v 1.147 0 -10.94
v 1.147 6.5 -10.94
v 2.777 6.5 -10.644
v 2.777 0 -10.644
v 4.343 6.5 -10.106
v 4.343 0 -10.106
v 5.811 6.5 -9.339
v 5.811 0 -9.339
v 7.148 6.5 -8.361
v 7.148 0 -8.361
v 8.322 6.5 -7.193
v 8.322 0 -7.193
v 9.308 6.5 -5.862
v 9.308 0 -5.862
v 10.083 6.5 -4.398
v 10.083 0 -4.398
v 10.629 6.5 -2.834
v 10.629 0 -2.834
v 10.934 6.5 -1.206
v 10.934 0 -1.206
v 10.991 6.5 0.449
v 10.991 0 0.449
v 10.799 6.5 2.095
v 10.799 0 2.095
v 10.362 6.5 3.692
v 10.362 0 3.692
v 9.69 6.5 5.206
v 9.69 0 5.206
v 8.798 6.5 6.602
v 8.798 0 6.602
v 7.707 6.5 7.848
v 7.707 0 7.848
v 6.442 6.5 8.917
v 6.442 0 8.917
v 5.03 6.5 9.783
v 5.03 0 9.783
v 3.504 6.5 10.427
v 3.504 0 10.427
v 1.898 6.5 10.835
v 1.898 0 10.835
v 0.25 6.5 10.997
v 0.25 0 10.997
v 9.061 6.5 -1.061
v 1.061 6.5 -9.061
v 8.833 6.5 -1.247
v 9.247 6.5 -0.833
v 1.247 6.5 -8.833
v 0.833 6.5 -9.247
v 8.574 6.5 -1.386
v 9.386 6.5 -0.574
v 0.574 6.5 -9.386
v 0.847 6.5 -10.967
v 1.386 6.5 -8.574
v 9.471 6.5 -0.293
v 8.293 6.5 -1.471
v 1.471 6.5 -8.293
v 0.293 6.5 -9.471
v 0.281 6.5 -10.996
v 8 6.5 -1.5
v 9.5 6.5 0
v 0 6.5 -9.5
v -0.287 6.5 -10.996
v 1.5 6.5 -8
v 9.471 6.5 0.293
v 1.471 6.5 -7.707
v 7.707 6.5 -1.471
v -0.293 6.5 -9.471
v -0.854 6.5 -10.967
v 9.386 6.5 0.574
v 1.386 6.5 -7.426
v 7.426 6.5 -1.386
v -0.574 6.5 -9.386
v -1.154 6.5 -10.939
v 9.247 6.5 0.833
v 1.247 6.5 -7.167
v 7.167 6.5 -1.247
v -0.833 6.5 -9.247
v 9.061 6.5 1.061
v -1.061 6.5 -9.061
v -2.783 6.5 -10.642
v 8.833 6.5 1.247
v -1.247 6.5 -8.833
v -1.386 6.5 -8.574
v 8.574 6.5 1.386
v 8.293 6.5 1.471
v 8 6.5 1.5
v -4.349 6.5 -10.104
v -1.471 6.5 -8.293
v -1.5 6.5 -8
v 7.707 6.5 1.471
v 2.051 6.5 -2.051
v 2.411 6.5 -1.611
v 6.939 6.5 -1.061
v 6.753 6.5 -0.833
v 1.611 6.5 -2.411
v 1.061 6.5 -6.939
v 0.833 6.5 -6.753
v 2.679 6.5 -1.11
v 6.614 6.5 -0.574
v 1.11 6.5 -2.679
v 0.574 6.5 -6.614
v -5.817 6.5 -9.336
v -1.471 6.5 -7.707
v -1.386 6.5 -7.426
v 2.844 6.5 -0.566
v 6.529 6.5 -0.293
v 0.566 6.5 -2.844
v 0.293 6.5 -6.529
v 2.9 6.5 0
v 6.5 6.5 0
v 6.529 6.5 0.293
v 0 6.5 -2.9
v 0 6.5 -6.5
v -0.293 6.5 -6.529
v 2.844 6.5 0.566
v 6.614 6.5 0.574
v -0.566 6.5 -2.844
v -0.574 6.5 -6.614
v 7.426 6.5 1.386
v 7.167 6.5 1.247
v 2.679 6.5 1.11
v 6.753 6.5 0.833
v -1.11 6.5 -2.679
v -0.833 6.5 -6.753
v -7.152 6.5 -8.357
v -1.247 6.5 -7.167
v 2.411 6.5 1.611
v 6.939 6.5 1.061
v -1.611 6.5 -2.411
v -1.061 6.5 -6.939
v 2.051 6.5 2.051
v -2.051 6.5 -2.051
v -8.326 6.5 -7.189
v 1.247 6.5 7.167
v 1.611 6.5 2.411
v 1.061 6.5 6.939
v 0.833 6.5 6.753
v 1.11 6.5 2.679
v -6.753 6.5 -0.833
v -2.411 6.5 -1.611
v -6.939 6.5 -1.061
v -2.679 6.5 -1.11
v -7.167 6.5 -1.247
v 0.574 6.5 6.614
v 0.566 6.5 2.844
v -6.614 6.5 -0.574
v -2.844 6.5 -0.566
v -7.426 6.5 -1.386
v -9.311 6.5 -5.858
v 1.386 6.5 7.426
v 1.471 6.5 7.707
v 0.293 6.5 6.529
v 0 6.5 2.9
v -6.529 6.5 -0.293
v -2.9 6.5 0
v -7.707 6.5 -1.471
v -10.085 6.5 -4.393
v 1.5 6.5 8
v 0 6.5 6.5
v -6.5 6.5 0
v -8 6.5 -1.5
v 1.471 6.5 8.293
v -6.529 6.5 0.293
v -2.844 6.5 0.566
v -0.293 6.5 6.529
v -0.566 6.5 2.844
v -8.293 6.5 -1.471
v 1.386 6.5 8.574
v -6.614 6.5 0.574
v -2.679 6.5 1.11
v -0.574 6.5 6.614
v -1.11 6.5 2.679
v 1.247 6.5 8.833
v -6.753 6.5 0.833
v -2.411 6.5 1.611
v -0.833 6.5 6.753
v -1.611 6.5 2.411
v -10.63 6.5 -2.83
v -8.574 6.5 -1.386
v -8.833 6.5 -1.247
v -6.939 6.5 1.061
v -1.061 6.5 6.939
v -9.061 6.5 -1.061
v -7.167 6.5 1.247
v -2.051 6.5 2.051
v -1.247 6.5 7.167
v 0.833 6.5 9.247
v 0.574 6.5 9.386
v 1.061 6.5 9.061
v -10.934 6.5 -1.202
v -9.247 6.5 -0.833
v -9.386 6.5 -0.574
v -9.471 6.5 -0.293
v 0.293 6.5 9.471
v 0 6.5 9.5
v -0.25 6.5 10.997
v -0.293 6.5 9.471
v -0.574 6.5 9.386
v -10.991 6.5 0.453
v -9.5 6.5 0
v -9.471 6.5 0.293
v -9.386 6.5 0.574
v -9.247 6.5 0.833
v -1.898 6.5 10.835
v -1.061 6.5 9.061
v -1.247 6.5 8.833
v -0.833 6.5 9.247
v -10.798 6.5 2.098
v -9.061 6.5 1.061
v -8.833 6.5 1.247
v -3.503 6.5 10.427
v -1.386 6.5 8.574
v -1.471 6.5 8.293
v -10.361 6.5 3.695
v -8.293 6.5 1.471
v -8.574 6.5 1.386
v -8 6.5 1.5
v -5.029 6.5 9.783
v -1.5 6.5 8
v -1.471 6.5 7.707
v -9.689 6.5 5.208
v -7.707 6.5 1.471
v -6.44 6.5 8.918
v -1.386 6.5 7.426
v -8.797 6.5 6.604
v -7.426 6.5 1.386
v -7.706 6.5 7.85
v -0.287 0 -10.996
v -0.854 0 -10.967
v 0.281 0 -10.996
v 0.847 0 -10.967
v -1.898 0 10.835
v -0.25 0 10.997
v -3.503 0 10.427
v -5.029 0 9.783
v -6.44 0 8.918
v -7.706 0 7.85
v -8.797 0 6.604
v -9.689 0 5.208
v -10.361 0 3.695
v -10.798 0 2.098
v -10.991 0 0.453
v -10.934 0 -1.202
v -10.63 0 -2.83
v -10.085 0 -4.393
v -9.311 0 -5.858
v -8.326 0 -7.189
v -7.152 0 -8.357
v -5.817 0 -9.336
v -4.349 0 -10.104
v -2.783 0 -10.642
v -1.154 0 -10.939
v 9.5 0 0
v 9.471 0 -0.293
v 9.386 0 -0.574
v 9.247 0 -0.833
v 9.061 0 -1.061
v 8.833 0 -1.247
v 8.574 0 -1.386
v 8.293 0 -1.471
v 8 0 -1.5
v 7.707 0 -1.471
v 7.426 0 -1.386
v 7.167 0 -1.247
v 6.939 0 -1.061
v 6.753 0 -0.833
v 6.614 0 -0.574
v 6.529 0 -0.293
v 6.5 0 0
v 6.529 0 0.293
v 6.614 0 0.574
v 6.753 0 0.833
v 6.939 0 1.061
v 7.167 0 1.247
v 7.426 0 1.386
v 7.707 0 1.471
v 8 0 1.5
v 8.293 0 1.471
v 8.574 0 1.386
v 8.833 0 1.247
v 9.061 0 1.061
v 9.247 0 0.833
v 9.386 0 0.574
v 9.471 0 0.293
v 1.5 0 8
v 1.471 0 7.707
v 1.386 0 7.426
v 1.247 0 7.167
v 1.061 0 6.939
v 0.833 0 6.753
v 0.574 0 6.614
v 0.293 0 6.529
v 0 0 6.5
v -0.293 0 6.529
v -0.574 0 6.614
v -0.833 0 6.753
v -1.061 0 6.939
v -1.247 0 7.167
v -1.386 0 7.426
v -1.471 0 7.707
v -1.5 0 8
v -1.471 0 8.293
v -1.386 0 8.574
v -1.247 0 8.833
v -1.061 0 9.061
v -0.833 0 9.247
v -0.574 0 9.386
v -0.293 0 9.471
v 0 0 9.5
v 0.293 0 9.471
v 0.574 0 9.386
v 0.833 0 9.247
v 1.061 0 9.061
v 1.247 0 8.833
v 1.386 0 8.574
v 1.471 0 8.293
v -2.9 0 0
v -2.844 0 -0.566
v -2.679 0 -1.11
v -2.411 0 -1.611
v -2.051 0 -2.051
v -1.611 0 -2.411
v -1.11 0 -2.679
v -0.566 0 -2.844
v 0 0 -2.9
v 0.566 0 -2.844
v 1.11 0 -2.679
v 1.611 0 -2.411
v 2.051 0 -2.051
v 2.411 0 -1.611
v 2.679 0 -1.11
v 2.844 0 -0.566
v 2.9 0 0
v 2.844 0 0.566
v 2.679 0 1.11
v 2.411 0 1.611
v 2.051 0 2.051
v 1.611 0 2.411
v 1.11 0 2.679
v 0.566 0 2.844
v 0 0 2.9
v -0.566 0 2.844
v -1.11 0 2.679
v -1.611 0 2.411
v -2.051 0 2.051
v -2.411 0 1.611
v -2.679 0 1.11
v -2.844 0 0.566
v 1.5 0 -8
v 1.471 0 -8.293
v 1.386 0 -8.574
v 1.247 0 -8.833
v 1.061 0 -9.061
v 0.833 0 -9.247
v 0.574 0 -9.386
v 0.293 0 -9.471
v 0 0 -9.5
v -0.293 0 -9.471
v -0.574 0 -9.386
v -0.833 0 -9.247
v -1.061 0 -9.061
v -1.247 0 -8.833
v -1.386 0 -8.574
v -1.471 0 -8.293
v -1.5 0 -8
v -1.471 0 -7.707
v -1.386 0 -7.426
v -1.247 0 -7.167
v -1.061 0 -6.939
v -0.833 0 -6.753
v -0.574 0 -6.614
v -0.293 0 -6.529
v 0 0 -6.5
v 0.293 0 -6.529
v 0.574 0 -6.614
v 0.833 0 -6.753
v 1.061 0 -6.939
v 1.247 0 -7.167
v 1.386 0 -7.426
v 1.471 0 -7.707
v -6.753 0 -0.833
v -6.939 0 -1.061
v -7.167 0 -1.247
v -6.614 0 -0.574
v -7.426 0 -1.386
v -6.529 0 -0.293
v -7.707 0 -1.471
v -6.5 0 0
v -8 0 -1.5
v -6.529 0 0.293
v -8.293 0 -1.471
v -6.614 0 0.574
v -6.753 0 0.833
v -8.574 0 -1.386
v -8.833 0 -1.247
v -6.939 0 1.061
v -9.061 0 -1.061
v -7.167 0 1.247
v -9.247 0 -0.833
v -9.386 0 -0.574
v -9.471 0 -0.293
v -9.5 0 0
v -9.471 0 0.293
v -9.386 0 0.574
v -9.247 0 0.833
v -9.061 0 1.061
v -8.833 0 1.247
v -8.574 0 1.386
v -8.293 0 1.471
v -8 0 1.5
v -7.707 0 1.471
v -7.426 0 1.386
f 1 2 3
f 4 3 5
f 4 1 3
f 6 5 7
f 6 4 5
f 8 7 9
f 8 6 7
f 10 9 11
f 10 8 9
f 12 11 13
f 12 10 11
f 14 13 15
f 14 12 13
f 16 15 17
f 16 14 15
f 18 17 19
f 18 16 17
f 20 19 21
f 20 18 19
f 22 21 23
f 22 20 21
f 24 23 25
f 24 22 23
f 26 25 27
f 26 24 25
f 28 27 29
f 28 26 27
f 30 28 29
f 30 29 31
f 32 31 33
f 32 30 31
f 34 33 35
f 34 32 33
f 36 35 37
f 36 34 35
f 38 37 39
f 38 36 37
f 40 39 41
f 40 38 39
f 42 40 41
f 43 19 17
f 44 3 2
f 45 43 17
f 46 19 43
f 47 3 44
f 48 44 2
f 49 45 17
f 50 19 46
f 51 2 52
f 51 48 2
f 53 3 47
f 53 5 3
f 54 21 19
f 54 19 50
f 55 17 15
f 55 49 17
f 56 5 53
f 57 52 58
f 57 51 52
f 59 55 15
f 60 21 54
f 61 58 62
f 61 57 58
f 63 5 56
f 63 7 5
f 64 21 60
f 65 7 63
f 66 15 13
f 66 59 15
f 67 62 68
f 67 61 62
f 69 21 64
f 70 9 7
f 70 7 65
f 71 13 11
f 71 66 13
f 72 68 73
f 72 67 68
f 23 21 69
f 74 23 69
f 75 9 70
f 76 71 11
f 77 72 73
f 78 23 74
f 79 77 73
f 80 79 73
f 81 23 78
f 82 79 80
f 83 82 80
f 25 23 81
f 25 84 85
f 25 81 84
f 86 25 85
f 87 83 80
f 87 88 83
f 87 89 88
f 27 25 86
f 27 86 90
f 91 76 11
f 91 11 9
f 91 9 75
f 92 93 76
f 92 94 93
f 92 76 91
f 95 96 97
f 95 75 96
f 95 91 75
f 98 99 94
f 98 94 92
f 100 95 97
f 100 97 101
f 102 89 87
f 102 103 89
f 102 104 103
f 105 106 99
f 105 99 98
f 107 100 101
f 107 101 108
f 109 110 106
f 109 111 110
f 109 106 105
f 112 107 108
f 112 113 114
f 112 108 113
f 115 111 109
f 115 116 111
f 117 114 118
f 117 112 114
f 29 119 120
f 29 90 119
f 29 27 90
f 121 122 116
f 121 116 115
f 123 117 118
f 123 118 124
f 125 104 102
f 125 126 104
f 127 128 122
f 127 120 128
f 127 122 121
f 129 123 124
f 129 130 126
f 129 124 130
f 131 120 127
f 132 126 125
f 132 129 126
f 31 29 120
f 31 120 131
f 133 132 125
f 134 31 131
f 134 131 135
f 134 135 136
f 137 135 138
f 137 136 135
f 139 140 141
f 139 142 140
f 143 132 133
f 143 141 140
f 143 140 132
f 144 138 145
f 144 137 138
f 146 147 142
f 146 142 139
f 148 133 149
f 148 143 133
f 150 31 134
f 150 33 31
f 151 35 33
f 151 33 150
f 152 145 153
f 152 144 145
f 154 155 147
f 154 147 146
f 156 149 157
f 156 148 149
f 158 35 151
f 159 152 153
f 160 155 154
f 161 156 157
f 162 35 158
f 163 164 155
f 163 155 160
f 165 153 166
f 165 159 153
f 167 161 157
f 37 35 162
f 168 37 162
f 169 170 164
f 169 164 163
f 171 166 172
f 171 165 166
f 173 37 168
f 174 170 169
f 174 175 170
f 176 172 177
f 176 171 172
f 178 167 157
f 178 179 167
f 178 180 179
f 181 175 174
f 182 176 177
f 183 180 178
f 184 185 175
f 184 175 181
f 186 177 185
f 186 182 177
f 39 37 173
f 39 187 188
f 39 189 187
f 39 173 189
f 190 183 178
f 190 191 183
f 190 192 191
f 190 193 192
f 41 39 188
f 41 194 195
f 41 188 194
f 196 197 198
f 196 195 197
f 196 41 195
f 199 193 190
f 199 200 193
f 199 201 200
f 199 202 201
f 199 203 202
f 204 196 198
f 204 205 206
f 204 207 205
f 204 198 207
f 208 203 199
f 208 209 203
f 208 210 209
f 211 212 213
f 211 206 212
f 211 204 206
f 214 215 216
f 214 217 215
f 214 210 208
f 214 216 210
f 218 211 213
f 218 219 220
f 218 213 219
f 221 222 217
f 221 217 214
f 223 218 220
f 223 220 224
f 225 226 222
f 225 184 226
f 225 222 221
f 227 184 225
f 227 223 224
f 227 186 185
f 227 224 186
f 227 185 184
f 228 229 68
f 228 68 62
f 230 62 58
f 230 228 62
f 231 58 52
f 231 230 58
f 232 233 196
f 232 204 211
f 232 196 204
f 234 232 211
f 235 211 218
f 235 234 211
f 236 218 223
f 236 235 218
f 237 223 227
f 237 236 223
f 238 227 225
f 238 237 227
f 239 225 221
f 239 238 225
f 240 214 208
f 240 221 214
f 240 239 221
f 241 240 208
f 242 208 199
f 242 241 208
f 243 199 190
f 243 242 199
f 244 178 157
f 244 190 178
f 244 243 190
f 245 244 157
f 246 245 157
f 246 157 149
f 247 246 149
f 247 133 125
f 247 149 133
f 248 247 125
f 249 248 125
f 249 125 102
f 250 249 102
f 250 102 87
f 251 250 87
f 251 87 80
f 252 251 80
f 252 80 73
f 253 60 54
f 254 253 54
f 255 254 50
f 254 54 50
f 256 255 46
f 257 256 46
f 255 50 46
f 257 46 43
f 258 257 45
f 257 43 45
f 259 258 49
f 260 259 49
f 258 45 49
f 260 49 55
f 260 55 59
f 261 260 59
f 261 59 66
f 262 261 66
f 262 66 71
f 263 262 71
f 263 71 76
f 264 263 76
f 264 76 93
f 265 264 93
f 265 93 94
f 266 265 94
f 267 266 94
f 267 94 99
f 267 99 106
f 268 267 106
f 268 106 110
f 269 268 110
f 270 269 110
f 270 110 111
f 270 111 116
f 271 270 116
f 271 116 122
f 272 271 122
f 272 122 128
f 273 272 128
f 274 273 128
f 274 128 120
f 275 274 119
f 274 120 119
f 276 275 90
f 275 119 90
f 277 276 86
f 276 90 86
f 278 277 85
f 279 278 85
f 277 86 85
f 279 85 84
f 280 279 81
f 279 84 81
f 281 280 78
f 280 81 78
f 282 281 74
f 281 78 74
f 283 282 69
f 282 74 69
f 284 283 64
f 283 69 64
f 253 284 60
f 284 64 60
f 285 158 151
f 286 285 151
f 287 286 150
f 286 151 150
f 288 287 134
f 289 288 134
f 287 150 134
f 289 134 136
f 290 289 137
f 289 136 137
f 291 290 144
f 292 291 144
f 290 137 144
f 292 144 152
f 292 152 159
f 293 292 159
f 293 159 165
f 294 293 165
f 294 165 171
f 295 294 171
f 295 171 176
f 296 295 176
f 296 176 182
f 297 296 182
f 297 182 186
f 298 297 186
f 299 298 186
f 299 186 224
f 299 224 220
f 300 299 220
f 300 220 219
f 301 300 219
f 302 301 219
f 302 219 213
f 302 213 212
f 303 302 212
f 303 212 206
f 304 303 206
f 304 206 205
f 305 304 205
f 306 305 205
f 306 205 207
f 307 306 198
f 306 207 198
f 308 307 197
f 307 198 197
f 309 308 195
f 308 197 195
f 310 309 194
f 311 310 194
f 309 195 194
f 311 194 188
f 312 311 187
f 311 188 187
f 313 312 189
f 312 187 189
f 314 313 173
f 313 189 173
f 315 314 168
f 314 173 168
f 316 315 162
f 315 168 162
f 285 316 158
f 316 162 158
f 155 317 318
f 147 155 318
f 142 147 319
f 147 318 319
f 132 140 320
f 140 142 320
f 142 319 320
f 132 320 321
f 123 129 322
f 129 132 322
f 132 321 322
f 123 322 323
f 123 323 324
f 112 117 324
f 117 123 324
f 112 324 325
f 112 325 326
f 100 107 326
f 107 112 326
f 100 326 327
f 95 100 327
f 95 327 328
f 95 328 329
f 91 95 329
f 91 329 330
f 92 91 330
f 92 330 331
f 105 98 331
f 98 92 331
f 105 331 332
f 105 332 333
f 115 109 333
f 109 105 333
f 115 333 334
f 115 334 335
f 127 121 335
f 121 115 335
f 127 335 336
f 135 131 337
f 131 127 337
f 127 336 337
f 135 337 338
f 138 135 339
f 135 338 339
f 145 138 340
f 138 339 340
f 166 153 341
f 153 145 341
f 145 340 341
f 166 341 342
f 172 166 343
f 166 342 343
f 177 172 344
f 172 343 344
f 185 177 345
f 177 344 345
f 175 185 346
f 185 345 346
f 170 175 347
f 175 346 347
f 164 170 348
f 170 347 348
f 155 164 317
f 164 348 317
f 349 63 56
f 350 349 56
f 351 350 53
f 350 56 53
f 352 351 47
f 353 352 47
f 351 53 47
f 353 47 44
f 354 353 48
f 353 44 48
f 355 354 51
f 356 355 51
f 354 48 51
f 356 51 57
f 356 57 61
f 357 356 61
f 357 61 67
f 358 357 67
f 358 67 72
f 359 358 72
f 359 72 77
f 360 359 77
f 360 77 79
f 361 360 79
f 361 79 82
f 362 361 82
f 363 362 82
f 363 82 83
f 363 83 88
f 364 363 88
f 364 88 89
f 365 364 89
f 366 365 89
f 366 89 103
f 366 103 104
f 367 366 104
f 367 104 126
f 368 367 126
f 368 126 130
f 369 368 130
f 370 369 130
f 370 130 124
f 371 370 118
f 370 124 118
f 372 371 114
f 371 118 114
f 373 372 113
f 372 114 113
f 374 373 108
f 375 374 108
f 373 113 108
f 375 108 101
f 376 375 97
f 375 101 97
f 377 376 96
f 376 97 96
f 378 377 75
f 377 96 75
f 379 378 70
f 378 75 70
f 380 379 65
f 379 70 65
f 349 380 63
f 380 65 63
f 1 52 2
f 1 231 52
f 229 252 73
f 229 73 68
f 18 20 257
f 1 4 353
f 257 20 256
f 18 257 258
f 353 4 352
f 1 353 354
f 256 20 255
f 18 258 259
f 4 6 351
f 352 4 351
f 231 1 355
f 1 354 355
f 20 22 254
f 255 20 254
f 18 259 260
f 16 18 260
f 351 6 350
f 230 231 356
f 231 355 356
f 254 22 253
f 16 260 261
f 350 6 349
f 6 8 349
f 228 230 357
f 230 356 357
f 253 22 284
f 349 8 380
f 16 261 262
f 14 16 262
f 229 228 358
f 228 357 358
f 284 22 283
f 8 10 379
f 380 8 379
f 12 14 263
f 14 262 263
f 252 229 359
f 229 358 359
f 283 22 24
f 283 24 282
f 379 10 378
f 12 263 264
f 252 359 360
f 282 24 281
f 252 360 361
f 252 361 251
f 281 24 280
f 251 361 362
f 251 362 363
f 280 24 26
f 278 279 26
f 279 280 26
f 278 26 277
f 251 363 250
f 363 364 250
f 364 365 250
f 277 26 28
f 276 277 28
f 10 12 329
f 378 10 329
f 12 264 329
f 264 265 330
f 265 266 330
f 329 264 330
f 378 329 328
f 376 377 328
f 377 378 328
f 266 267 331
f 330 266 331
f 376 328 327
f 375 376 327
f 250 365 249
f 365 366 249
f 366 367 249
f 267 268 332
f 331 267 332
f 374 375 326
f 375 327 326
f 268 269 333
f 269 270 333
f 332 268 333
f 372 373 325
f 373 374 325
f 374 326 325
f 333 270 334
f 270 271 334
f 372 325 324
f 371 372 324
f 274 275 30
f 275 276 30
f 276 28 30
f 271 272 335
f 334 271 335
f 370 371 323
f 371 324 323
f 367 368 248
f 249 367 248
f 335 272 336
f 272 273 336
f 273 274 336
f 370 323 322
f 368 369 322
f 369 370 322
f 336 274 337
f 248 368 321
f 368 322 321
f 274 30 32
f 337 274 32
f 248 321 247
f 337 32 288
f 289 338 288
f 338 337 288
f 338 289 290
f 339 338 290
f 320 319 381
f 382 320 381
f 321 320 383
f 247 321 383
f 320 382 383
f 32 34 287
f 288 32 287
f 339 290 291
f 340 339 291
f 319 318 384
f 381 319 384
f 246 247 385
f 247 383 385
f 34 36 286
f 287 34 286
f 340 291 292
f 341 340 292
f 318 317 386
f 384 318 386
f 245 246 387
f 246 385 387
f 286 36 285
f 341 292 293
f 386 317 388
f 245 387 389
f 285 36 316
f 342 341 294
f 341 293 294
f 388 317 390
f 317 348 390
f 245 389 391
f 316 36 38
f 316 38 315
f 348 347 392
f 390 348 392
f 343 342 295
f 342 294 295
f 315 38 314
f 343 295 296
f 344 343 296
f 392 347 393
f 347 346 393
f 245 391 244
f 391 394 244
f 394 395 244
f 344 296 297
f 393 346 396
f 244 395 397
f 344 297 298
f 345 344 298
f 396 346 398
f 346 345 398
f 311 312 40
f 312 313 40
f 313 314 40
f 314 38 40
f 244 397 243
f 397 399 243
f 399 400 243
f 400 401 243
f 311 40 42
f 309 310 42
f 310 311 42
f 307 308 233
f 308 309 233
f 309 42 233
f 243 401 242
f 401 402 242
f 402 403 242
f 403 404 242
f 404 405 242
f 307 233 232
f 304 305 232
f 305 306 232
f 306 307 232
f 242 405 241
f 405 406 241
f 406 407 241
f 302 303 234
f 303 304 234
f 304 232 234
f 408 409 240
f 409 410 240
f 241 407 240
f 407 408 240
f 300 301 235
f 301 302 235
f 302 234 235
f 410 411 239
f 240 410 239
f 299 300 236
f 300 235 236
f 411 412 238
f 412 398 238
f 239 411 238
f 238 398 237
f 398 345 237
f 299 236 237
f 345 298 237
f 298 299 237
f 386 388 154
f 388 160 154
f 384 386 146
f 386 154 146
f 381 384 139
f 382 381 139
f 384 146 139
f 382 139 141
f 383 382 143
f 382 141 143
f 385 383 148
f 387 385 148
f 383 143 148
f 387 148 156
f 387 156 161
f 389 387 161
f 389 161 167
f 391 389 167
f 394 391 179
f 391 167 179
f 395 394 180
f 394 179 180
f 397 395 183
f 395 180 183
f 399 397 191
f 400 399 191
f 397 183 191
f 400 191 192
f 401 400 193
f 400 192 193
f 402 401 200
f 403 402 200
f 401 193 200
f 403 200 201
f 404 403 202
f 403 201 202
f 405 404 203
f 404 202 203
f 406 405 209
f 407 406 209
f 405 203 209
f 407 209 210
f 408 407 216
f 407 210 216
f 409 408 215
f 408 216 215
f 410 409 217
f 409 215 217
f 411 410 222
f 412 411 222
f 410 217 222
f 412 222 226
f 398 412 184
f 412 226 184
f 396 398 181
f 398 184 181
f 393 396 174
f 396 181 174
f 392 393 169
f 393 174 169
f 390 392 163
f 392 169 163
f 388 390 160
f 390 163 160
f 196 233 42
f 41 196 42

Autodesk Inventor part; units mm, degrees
ref_plane "YZ Plane" through (0, 0, 0) normal (1, 0, 0) x (0, 1, 0)
ref_plane "XZ Plane" through (0, 0, 0) normal (0, 1, 0) x (-1, 0, 0)
ref_plane "XY Plane" through (0, 0, 0) normal (0, 0, 1) x (1, 0, 0)
sketch "Эскиз1" plane through (0, 0, 0) normal (0, 1, 0) x (-1, 0, 0)
  arc A0 (-0.25, 9.2247) -> (0.25, 9.2247) centre (0, 8) ccw
  line L0 (-0.25, 10.9972) -> (-0.25, 9.2247)
  arc A1 (-0.25, 10.9972) -> (-1.1469, -10.94) centre (0, 0) ccw
  line L1 (-1.1469, -10.6297) -> (-1.1469, -10.94)
  line L2 (-0.8473, -10.6297) -> (-1.1469, -10.6297)
  line L3 (-0.8473, -10.9673) -> (-0.8473, -10.6297)
  arc A2 (-0.8473, -10.9673) -> (0.8535, -10.9668) centre (0, 0) ccw
  line L4 (0.8535, -10.6297) -> (0.8535, -10.9668)
  line L5 (1.1541, -10.6297) -> (0.8535, -10.6297)
  line L6 (1.1541, -10.9393) -> (1.1541, -10.6297)
  arc A3 (1.1541, -10.9393) -> (0.25, 10.9972) centre (0, 0) ccw
  line L7 (0.25, 9.2247) -> (0.25, 10.9972)
  circle A4 centre (8, 0) radius 1.25
  circle A5 centre (0, -8) radius 1.25
  circle A6 centre (-8, 0) radius 1.25
  circle A7 centre (0, -5.5) radius 0.75
  circle A8 centre (4.7631, 2.75) radius 0.75
  circle A9 centre (-4.7631, 2.75) radius 0.75
  circle A10 centre (0, 0) radius 2.9
  arc A11 (0.25, 9.2247) -> (-0.25, 9.2247) centre (0, 8) ccw
  line L8 (0.25, 10.9972) -> (-0.25, 10.9972)
  line L9 (1.1541, -10.9393) -> (0.8535, -10.9668)
  line L10 (-0.8473, -10.9673) -> (-1.1541, -10.9393)
extrude "Выдавливание1" add sketch "Эскиз1" along normal blind 6.5 contours A0 L7 A3 L6 L5 L4 A2 L3 L2 L1 A1 L0 | L0 L8 L7 A11 | L9 L4 L5 L6 | L1 L2 L3 L10 | A7 | A8 | A9
sketch "Эскиз2" plane through (0, 6.5, 0) normal (0, 1, 0) x (1, 0, 0)
  circle A0 centre (0, -8) radius 1.25 projected
  circle A1 centre (0, -8) radius 1.5
  circle A2 centre (-8, 0) radius 1.25 projected
  circle A3 centre (-8, 0) radius 1.5
  circle A4 centre (0, 8) radius 1.25 projected
  circle A5 centre (0, 8) radius 1.5
  circle A6 centre (8, 0) radius 1.25 projected
  circle A7 centre (8, 0) radius 1.5
  point P0 (0, 0)
  dimension "d2" = 3
  dimension "d3" = 3
  dimension "d4" = 3
  dimension "d5" = 3
extrude "Выдавливание2" cut sketch "Эскиз2" against normal blind 10 contours A0 | A1 | A2 | A3 | A4 | A5 | A6 | A7
properties part number "проставка"
